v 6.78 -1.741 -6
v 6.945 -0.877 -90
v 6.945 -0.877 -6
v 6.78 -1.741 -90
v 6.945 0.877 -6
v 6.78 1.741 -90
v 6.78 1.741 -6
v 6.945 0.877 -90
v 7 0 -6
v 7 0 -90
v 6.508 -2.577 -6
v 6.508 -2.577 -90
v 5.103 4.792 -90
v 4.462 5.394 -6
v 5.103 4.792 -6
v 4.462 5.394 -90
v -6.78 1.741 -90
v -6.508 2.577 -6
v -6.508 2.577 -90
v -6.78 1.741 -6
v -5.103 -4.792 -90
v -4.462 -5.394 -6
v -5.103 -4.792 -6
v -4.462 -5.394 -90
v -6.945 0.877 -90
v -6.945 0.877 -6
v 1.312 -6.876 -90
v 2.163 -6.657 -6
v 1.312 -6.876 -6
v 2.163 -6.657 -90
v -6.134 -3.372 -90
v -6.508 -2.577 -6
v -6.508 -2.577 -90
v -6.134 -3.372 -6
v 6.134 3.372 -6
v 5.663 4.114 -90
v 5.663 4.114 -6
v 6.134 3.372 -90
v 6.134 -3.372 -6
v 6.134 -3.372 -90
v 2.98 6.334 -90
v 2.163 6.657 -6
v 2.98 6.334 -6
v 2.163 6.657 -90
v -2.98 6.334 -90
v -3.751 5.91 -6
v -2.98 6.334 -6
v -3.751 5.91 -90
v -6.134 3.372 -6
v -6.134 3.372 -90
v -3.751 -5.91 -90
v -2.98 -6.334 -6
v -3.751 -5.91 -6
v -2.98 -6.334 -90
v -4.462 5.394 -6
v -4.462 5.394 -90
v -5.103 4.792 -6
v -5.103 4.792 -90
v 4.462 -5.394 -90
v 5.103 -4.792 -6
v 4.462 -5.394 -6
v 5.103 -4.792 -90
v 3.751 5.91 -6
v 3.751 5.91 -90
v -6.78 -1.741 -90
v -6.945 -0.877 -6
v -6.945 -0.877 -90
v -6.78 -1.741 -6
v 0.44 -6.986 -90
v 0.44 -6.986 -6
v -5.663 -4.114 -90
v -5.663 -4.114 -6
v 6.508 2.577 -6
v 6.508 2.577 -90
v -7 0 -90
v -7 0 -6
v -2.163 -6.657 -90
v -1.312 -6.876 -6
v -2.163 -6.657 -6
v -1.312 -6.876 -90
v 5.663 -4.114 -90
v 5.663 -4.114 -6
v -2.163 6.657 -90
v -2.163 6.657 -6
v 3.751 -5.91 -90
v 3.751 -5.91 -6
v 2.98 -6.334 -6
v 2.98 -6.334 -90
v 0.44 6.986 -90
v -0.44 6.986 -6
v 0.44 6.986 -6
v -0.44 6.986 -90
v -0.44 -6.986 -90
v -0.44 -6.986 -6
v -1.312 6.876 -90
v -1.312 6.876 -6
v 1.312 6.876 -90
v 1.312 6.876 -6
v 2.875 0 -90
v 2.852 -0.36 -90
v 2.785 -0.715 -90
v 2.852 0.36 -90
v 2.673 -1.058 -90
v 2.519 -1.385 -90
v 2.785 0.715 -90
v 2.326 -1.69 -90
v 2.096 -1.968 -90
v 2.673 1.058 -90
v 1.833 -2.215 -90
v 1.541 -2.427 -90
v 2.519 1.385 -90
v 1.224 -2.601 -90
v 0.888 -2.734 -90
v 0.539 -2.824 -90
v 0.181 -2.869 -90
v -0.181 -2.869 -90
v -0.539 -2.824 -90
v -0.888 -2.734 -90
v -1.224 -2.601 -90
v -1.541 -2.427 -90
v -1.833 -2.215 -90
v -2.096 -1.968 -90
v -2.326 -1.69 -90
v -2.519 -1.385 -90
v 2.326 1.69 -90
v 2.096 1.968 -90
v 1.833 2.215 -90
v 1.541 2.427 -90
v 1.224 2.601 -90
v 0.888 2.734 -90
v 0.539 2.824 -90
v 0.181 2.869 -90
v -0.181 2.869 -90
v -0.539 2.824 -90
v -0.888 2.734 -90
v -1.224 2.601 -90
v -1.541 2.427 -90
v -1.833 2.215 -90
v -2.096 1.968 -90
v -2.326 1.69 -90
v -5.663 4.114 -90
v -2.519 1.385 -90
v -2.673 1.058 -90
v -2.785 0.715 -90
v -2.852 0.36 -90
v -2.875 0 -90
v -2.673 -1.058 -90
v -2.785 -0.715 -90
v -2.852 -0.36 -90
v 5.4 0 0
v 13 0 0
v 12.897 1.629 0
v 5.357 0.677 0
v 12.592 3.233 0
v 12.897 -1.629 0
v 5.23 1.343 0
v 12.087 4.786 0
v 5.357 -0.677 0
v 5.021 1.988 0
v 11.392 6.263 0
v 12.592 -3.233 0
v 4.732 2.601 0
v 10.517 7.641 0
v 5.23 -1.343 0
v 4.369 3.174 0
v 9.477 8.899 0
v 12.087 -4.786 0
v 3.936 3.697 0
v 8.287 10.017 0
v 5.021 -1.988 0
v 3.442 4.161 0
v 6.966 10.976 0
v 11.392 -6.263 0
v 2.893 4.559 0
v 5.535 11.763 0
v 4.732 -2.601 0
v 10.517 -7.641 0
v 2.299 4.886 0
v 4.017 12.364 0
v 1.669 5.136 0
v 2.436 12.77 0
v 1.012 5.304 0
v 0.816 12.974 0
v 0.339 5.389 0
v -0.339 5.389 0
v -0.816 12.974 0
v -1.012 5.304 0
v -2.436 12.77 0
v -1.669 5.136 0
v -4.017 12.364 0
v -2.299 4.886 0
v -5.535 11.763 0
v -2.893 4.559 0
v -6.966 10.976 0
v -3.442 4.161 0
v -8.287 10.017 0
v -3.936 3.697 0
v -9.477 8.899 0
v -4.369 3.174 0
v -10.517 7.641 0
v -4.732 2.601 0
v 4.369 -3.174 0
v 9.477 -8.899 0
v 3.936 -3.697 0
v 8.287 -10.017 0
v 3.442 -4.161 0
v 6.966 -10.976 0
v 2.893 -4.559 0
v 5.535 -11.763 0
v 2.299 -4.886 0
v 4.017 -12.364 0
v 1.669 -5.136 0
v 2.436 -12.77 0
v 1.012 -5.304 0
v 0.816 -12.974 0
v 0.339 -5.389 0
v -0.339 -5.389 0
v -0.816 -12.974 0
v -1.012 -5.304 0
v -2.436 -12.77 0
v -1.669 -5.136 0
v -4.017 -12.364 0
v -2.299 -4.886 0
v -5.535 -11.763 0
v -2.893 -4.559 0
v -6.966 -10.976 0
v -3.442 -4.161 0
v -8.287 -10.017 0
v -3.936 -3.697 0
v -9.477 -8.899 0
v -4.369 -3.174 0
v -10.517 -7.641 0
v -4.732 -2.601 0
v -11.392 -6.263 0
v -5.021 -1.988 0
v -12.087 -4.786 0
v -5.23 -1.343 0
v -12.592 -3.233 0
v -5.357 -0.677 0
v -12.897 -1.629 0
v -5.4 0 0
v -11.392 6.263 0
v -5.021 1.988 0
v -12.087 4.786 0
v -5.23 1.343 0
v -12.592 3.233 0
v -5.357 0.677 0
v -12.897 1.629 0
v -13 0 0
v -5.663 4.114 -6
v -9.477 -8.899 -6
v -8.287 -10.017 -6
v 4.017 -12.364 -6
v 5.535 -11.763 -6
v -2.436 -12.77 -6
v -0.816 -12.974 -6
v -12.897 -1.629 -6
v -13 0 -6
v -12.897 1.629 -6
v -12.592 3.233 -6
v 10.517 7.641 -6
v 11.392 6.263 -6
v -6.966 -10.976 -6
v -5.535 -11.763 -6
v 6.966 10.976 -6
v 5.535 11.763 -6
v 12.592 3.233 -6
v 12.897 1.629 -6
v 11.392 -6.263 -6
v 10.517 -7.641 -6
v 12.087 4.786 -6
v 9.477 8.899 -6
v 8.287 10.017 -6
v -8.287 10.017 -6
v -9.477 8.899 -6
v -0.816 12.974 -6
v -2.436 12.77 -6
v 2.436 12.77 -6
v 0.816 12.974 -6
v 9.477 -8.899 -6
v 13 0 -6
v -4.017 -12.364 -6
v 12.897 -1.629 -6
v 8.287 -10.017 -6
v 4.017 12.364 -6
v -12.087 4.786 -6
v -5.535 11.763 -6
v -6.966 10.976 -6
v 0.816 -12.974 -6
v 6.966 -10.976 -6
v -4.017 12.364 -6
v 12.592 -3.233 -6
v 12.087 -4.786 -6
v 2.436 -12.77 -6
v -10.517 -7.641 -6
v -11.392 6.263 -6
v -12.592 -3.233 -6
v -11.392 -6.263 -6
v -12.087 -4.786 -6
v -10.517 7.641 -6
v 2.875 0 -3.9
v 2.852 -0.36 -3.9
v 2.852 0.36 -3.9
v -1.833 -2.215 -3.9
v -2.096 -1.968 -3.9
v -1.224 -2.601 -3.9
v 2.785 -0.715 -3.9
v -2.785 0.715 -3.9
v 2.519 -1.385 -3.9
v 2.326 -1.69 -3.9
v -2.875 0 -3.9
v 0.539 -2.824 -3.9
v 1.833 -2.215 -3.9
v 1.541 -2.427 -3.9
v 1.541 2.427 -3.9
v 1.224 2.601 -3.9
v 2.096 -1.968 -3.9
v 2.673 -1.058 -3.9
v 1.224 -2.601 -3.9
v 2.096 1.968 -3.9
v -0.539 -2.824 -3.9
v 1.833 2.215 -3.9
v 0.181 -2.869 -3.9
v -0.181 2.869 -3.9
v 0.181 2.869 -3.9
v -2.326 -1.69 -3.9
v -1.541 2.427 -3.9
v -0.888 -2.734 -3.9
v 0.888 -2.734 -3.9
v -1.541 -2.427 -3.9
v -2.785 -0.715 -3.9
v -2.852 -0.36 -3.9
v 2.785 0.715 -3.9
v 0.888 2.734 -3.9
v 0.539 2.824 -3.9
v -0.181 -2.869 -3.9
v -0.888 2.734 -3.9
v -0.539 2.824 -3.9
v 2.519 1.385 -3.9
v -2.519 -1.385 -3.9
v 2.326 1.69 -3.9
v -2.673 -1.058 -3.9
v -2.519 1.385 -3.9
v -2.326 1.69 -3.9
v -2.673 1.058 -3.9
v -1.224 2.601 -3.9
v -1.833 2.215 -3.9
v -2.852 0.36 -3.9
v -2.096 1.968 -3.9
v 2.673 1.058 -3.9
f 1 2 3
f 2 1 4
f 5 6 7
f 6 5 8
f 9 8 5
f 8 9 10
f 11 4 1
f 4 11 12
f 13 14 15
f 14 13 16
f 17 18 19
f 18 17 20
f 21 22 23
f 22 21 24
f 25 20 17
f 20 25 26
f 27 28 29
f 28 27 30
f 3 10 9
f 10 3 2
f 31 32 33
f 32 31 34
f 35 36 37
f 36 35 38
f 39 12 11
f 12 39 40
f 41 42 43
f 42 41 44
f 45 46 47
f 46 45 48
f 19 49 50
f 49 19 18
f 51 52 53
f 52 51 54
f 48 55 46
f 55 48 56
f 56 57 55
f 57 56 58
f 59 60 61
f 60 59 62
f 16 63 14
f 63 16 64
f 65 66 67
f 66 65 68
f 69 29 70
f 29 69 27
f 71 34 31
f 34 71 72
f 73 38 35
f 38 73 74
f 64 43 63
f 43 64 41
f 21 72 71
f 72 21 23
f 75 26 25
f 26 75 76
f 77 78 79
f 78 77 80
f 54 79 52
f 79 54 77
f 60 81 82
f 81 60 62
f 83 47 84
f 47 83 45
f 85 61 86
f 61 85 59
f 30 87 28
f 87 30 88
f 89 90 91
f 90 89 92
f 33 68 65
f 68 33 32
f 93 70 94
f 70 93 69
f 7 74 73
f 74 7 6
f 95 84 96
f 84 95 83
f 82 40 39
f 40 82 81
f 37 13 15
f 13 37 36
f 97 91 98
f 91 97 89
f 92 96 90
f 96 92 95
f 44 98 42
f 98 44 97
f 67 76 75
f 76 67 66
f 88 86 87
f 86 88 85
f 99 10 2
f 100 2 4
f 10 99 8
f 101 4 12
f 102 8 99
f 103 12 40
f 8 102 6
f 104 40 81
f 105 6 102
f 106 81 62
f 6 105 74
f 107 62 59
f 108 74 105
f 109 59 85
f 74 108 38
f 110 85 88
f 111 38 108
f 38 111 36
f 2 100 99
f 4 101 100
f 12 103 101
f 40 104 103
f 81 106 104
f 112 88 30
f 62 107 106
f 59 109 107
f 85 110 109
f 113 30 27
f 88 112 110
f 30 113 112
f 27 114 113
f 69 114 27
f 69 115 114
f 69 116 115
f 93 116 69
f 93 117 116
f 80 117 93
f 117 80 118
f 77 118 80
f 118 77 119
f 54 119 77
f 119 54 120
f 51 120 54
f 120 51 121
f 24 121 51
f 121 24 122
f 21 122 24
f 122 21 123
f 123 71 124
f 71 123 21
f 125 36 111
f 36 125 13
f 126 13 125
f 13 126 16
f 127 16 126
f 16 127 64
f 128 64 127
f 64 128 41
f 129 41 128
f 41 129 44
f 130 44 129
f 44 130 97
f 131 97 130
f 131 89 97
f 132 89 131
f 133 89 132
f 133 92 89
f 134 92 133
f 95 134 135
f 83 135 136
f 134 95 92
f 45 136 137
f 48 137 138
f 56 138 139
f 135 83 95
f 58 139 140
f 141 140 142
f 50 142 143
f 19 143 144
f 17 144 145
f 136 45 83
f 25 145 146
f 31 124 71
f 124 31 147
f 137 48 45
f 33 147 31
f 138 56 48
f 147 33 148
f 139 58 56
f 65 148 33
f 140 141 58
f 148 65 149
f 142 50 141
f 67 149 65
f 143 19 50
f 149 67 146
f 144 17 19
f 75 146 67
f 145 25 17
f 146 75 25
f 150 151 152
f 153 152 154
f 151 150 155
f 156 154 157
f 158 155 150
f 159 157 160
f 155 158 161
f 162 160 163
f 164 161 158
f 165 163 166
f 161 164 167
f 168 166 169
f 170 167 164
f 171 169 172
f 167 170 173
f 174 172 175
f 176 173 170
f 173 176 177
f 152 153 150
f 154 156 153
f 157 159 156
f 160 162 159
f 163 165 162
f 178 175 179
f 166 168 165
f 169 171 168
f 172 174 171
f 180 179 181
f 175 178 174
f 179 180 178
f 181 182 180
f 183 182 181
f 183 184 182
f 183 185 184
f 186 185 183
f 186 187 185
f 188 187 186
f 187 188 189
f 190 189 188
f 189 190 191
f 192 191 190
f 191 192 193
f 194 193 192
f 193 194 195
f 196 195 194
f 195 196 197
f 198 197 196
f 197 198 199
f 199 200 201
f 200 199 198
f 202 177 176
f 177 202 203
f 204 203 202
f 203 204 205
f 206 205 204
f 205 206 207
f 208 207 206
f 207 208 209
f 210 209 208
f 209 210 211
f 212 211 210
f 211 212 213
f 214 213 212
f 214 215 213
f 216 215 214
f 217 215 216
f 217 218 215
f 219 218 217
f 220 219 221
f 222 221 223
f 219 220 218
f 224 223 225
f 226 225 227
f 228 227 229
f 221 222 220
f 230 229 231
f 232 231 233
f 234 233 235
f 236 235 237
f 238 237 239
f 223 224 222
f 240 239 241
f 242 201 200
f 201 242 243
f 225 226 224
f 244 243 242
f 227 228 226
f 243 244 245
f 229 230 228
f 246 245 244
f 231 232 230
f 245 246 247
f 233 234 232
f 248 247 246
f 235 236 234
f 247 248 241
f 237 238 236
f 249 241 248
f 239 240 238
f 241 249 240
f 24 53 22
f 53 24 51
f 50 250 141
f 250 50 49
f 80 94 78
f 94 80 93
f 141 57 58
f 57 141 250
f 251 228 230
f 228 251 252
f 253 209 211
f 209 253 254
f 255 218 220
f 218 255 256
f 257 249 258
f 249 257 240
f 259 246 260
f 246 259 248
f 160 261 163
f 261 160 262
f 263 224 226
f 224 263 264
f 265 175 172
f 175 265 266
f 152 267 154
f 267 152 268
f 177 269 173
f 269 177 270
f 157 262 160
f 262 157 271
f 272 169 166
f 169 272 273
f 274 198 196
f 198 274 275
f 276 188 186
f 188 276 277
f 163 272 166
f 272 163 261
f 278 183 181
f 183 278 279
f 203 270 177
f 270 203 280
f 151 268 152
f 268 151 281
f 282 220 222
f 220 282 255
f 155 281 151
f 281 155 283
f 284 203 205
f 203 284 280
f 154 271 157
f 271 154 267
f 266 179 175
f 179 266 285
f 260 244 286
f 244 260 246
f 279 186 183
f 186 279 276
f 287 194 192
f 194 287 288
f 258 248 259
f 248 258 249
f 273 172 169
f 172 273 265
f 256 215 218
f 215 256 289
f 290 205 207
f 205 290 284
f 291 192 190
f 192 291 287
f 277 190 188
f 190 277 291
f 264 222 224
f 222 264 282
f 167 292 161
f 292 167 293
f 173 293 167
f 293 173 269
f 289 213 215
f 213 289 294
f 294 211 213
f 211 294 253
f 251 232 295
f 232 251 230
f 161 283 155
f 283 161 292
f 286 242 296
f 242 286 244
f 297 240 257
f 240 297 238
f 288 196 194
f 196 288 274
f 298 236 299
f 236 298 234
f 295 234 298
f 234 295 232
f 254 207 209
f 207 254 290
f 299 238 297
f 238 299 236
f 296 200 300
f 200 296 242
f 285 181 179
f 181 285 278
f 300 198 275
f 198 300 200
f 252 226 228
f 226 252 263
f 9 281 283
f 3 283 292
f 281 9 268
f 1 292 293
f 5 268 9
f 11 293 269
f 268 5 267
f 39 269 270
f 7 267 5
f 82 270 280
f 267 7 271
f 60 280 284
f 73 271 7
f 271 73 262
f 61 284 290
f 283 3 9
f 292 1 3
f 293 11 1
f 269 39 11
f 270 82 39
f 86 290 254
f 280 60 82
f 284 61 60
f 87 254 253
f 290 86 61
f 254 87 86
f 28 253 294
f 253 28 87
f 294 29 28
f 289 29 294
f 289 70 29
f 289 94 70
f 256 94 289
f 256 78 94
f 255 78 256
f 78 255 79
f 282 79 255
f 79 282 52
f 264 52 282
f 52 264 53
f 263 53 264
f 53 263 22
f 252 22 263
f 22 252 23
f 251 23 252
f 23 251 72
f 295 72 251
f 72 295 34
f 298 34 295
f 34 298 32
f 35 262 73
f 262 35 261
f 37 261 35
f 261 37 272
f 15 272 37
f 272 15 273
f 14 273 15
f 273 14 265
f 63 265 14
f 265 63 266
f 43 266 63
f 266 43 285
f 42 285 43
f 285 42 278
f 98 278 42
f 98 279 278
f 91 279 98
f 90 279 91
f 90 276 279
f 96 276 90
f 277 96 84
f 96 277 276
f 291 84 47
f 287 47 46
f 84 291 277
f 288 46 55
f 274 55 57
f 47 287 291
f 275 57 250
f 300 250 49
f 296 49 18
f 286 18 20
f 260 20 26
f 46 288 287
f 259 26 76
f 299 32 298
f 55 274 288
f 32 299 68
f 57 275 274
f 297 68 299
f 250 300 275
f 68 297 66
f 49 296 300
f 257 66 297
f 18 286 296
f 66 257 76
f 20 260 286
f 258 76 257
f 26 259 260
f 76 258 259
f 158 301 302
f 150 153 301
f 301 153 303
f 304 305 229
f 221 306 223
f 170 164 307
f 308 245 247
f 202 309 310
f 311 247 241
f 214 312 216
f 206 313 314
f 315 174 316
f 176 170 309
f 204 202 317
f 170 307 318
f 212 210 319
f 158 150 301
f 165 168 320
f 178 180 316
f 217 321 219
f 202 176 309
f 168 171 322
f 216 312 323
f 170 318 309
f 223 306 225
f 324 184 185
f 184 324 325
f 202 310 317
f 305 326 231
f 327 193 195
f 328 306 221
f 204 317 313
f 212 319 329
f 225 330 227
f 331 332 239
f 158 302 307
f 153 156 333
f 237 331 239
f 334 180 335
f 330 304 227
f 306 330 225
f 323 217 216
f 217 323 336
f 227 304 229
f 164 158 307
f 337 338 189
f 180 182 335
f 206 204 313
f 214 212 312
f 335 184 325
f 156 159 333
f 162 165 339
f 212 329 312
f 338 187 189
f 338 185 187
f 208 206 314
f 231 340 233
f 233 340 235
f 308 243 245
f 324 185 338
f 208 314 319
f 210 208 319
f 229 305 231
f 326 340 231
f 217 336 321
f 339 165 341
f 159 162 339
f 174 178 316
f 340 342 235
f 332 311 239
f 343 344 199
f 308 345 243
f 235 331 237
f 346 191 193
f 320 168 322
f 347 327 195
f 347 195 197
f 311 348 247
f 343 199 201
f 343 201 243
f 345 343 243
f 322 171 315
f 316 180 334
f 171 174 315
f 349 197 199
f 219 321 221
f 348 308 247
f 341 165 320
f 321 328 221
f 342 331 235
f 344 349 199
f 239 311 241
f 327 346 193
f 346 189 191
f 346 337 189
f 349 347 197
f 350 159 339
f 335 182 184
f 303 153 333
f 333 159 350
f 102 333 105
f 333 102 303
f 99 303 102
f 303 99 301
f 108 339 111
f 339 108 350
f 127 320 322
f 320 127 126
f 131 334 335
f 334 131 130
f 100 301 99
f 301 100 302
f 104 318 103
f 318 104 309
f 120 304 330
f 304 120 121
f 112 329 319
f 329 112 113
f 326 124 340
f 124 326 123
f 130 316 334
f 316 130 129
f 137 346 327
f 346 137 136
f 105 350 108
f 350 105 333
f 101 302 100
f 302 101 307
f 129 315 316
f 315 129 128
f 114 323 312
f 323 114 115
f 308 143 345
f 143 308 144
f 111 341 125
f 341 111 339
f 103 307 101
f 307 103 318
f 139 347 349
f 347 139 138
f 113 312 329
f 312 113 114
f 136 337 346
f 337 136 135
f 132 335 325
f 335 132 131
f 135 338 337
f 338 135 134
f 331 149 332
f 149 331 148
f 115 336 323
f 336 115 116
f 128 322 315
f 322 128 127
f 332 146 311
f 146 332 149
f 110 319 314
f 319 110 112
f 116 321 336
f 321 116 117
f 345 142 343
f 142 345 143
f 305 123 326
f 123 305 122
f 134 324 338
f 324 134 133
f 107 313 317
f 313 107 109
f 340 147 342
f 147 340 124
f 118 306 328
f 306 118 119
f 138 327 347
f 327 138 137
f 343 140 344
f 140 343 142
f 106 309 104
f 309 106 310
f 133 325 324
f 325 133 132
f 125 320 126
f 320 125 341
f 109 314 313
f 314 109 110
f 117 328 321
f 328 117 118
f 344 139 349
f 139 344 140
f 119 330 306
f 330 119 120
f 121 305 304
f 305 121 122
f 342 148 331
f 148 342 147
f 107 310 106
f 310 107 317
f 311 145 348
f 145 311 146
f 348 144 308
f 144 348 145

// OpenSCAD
$fn = 50;


difference() {
	union() {
		translate(v = [0, 0, -90.0000000000]) {
			cylinder(h = 90, r = 7.0000000000);
		}
		translate(v = [0, 0, -6.0000000000]) {
			cylinder(h = 6, r = 13.0000000000);
		}
	}
	union() {
		translate(v = [0, 0, 0]) {
			rotate(a = [0, 0, 0]) {
				difference() {
					union() {
						#translate(v = [0, 0, -90.0000000000]) {
							cylinder(h = 90, r = 2.6000000000);
						}
						#translate(v = [0, 0, -3.9000000000]) {
							cylinder(h = 3.9000000000, r = 7.0000000000, r1 = 2.8750000000, r2 = 5.4000000000);
						}
						#translate(v = [0, 0, -90.0000000000]) {
							cylinder(h = 90, r = 2.8750000000);
						}
						#translate(v = [0, 0, -90.0000000000]) {
							cylinder(h = 90, r = 2.6000000000);
						}
					}
					union();
				}
			}
		}
	}
}
